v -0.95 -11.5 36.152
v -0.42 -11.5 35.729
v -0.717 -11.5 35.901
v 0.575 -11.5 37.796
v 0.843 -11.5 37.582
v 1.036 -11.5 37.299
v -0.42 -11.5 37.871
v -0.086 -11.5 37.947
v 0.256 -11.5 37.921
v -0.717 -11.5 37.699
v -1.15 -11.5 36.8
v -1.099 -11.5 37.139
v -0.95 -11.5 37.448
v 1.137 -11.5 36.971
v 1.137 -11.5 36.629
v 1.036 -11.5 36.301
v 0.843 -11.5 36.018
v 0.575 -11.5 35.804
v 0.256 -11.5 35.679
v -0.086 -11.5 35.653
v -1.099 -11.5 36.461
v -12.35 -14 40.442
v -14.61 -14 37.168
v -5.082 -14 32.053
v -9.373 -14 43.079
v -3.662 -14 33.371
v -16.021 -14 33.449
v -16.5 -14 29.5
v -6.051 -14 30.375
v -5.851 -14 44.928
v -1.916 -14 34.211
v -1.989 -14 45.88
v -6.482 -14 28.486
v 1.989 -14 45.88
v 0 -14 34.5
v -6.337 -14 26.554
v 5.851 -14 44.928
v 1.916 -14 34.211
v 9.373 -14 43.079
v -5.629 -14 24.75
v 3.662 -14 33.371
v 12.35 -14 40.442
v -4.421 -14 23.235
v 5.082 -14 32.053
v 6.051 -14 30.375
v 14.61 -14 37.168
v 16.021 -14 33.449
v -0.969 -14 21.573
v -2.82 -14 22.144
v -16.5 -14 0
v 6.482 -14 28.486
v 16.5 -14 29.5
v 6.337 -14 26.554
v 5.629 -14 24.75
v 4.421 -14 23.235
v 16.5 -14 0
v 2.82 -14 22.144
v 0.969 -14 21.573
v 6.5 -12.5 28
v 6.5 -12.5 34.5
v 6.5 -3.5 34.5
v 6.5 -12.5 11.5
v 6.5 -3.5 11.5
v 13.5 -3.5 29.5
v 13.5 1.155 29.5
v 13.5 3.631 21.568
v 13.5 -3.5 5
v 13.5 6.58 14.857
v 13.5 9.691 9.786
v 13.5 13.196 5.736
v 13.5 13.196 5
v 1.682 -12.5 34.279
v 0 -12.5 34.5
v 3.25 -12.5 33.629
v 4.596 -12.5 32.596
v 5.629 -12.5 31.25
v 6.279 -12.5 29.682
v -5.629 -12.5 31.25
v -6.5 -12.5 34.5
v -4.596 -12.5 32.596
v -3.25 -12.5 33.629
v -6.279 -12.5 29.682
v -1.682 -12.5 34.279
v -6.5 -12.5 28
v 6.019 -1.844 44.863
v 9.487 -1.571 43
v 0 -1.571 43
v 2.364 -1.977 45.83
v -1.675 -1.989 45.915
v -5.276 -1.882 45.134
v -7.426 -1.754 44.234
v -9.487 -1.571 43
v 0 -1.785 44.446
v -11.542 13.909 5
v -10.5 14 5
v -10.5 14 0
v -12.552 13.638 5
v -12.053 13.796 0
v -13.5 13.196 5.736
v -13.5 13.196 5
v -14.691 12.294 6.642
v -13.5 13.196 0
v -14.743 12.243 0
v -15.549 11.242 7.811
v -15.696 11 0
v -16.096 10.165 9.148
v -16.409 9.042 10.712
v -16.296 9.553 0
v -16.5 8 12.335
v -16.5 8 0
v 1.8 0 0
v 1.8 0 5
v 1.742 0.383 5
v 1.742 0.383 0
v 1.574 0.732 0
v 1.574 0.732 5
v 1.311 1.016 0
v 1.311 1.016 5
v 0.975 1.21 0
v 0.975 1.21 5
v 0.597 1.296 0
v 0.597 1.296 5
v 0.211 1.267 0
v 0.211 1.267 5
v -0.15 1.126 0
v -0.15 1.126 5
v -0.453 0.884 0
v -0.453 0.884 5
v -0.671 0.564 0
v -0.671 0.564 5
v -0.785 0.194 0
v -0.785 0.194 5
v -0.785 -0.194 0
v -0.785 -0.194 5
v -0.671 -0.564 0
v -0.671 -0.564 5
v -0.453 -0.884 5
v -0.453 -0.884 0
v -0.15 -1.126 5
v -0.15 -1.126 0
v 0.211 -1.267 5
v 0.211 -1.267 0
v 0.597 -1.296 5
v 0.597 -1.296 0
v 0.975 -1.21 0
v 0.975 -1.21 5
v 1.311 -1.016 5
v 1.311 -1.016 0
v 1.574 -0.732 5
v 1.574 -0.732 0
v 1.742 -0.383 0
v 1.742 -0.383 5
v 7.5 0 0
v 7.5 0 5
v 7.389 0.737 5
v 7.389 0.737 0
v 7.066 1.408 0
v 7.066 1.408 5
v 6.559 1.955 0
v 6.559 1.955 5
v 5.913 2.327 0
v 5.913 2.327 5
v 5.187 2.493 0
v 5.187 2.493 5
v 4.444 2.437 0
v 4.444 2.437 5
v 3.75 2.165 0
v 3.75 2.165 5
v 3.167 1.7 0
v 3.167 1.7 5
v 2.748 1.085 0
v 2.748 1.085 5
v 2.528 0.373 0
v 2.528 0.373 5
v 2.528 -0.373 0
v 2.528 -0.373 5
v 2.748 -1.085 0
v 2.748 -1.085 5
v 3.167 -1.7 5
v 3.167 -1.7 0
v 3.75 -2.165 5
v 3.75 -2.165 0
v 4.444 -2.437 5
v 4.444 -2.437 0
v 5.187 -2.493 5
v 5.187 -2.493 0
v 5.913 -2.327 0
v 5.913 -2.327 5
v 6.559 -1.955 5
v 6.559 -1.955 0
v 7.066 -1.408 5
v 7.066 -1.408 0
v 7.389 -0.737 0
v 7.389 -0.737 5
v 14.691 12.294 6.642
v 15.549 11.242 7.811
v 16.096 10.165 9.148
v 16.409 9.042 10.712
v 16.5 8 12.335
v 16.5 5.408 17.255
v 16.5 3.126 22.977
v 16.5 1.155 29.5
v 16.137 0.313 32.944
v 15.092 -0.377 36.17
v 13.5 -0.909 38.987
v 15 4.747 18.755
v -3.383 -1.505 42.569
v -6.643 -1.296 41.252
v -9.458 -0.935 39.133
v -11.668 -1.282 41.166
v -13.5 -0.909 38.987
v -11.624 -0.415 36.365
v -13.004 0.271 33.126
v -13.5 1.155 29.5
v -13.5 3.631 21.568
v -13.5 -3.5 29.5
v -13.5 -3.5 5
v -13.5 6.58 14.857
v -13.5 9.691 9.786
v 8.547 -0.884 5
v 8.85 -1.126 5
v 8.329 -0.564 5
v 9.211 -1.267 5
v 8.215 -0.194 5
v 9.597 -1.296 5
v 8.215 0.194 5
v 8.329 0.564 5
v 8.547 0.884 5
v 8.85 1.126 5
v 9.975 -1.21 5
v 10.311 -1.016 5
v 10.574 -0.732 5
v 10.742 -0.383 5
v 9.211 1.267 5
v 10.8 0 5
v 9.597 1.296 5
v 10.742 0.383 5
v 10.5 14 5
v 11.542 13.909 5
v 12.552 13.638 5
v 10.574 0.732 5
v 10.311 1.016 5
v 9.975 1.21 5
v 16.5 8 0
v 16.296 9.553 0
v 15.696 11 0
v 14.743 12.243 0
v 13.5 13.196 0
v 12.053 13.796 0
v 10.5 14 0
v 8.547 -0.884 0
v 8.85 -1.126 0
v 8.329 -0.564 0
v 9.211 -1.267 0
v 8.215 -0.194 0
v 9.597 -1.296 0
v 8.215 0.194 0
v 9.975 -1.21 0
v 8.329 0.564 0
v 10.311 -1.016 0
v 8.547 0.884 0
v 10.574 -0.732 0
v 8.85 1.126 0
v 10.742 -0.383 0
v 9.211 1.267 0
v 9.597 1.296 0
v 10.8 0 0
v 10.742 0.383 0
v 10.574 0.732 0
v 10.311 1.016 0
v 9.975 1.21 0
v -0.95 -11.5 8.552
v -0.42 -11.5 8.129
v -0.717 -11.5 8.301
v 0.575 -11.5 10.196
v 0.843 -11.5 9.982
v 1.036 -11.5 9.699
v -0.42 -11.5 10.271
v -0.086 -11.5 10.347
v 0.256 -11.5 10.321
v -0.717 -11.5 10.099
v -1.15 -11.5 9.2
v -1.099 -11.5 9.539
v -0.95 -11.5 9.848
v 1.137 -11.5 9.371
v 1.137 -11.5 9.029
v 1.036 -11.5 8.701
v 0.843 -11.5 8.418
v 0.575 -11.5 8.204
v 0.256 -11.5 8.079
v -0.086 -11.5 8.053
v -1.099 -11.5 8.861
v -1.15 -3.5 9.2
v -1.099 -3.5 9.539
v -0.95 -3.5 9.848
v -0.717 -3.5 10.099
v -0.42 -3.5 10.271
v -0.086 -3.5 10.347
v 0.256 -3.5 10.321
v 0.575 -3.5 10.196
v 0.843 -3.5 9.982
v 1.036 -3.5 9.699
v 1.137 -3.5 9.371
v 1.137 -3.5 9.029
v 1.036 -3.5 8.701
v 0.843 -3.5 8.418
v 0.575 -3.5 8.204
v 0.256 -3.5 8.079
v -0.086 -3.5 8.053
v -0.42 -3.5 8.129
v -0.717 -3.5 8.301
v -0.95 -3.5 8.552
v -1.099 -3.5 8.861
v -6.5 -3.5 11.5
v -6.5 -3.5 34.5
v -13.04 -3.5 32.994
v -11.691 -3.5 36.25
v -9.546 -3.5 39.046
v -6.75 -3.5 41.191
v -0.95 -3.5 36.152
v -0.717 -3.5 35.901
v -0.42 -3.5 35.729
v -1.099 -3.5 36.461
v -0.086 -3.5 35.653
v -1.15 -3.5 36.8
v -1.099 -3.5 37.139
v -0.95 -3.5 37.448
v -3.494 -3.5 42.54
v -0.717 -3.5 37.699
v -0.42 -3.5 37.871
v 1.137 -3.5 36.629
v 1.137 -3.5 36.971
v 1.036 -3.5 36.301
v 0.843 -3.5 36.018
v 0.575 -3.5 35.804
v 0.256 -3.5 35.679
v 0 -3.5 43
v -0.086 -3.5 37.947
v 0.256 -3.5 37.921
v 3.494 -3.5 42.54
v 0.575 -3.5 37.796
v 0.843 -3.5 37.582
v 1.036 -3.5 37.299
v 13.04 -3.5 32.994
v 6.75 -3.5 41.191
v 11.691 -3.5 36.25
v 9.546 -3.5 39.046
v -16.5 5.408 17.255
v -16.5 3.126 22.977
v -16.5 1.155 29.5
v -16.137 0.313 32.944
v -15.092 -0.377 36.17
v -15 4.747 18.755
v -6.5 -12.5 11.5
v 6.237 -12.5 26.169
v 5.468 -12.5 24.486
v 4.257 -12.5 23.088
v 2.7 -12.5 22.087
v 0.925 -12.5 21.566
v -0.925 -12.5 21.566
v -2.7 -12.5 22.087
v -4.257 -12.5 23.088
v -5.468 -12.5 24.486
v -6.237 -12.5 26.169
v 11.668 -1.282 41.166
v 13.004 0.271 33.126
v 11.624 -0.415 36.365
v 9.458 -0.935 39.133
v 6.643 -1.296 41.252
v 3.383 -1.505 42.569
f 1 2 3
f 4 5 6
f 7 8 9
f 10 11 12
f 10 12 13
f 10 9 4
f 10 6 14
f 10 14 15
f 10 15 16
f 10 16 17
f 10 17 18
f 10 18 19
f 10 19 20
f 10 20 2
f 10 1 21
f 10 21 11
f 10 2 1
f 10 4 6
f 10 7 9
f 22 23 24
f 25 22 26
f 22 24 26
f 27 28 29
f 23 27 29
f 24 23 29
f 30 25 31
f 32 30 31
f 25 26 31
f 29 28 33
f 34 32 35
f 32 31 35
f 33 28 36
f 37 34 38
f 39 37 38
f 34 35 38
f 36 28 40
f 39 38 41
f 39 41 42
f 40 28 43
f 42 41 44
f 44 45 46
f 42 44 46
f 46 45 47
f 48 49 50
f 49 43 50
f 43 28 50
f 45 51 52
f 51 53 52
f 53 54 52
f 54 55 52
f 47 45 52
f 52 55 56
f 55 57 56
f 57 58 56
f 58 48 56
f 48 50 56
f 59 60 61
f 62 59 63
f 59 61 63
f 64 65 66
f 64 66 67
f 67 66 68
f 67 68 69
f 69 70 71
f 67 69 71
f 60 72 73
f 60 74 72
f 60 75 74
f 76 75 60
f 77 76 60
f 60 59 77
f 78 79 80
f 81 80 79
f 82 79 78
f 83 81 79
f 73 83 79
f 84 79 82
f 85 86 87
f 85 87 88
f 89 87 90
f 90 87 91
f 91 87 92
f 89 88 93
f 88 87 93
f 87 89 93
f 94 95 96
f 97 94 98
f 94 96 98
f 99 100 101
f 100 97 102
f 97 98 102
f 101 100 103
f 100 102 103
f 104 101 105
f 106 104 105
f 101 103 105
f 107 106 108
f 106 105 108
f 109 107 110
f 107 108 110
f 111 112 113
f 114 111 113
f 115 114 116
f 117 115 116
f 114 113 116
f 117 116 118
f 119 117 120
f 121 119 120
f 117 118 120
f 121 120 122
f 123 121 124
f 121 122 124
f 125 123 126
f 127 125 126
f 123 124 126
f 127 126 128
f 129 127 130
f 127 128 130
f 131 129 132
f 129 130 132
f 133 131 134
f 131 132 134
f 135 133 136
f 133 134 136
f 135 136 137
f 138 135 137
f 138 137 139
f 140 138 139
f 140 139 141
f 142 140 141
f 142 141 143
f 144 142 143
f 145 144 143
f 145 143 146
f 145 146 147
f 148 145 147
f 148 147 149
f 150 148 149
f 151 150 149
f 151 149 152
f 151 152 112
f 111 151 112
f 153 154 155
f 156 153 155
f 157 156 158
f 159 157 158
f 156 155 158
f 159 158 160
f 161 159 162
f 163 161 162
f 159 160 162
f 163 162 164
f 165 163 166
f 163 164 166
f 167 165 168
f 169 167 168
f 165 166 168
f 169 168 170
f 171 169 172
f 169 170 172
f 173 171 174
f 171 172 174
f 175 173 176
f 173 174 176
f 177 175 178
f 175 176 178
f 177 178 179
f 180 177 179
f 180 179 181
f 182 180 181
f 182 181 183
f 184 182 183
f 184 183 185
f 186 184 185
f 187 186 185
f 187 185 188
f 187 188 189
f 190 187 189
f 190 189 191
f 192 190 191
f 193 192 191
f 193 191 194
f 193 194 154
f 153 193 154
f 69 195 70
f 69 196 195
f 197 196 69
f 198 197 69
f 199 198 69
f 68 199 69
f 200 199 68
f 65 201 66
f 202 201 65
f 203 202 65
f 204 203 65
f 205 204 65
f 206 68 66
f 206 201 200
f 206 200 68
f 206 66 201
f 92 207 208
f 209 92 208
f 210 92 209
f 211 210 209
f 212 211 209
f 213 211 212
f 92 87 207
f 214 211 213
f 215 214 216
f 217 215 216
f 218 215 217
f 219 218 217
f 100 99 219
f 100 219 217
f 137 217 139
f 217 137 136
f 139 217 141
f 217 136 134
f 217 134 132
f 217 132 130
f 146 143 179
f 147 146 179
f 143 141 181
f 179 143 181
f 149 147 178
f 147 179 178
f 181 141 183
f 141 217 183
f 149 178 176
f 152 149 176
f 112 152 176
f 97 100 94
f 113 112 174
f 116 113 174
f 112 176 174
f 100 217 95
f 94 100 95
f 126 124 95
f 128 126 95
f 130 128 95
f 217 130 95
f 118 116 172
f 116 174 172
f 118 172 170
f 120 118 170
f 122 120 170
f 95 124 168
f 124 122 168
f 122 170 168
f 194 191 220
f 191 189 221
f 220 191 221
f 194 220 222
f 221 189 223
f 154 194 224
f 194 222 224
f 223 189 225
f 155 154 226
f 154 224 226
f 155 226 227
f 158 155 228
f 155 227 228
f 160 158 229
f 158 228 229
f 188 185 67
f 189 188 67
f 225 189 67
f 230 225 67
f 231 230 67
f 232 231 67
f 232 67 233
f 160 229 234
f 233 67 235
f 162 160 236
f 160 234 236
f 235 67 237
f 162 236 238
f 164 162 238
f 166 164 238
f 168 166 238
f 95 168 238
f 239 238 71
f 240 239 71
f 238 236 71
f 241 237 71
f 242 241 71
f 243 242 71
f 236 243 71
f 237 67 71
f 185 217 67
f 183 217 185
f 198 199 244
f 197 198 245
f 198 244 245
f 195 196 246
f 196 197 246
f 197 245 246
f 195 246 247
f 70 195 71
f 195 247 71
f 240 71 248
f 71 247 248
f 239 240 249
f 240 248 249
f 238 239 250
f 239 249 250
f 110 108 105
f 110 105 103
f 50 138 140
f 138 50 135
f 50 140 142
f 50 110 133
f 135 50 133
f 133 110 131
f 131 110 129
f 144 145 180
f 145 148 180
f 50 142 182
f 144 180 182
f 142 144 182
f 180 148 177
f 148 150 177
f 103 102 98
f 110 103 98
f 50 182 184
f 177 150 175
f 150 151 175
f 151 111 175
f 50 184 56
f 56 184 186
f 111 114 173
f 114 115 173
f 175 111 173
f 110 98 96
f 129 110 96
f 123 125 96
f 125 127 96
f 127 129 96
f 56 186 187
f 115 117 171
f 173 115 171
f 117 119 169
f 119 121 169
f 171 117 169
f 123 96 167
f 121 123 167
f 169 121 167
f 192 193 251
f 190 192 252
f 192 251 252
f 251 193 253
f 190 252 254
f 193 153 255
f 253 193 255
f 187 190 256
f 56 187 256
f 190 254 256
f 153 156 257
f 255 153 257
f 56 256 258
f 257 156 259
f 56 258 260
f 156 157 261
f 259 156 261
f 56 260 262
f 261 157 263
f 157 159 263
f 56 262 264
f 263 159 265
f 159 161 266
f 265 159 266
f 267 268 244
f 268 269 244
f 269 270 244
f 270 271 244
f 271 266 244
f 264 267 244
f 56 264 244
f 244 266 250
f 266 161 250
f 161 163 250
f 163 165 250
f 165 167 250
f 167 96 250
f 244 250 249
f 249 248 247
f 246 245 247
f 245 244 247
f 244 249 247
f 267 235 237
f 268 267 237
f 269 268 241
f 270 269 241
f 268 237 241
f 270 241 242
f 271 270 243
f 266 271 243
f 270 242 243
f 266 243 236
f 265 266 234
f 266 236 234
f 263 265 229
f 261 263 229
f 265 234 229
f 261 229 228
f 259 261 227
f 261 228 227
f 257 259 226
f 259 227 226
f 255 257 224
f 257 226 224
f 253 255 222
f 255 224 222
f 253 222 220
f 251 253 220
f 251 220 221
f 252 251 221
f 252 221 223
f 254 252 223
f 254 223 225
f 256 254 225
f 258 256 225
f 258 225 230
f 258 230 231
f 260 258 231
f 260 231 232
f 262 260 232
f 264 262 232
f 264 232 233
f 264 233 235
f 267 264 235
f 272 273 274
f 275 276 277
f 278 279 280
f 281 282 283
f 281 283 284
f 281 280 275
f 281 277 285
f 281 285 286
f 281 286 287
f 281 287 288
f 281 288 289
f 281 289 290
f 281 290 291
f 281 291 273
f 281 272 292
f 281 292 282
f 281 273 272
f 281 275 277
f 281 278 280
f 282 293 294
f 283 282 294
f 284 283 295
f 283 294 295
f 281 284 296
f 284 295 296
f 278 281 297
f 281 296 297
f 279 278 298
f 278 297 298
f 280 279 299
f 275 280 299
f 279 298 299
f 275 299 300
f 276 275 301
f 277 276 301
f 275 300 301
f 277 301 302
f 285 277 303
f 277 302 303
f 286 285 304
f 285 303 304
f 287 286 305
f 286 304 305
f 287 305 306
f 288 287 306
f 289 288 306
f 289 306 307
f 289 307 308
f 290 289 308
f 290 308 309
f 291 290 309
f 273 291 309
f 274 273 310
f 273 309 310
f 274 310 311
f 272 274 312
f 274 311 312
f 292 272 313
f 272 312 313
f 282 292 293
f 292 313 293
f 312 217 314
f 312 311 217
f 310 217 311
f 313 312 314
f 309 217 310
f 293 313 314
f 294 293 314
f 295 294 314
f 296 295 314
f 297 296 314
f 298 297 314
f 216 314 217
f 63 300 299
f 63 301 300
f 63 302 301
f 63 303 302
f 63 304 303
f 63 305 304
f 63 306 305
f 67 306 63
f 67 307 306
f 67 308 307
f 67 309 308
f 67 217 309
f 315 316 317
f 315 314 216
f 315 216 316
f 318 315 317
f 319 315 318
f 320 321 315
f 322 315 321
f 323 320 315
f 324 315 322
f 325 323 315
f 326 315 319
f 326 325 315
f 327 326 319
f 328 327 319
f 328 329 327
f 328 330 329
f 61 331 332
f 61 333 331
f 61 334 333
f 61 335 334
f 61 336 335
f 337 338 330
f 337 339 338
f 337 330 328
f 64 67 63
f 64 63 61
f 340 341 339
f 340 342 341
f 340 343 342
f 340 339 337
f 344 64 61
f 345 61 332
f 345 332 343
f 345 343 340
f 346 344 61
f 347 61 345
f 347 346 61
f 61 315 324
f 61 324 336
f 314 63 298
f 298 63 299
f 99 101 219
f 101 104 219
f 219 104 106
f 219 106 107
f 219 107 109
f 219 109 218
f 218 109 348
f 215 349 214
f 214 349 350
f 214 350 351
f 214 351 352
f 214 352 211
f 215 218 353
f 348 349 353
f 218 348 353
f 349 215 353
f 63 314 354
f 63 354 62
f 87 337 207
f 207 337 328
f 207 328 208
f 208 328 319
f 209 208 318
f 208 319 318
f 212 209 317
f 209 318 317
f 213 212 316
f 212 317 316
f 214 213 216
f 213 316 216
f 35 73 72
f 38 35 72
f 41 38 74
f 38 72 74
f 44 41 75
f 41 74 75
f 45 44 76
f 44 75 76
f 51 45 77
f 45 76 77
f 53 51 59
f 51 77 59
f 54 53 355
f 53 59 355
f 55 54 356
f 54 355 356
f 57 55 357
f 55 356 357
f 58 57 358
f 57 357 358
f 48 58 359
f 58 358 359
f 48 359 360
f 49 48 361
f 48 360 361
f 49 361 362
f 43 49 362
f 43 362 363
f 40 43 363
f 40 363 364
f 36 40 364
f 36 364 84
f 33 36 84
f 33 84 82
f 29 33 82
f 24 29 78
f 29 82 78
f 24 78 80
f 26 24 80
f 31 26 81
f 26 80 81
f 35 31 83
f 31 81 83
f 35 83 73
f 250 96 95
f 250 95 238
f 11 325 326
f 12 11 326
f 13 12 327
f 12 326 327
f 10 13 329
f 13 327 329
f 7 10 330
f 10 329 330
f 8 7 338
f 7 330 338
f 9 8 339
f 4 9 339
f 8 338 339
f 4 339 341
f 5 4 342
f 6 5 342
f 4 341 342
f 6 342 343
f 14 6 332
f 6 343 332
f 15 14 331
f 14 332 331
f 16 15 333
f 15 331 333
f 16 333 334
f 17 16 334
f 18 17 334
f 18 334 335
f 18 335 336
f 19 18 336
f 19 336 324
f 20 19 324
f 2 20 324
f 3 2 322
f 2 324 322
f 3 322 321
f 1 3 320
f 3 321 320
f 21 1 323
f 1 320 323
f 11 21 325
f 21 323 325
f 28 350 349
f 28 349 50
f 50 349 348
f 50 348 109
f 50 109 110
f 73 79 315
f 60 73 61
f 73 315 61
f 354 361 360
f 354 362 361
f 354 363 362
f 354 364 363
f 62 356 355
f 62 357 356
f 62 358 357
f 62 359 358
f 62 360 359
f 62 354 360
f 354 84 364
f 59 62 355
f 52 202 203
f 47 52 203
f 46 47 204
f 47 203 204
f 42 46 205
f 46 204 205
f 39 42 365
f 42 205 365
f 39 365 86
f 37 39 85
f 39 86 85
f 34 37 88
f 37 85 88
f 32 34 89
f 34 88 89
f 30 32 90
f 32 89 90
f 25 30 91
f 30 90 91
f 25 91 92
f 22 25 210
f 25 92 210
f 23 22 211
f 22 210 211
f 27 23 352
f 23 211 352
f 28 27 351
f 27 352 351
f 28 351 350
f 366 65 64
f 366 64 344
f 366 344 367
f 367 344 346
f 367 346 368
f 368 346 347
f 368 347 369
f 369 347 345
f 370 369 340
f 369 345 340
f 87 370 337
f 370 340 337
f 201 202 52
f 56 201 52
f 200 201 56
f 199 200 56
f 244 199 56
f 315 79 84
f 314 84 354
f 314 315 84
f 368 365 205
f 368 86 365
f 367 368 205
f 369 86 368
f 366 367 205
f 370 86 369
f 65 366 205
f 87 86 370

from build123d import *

# Parameters (mm, degrees)
SKETCH2_W               = 33
SKETCH2_H               = 28
BOSS_EXTRUDE1_DEPTH     = 46
CUT_EXTRUDE1_DEPTH      = 59.318093247
CUT_EXTRUDE1_DEPTH_BACK = 59.318093247
SKETCH3_W               = 41
SKETCH3_H               = 17.5
BOSS_EXTRUDE2_DEPTH     = 3
BOSS_EXTRUDE3_DEPTH     = 27
FILLET2_START           = -3.5
FILLET2_DEPTH           = 4.654998639
FILLET2_START_2         = -13.5
FILLET2_2_DEPTH         = 27
FILLET3_R               = 16.5
FILLET4_R               = 6
SKETCH6_W               = 13
SKETCH6_H               = 23
CUT_EXTRUDE2_DEPTH      = 9
SKETCH7_R               = 6.5
CUT_EXTRUDE3_DEPTH      = 9
SKETCH8_R               = 1.15
CUT_EXTRUDE4_DEPTH      = 8
SKETCH9_R               = 1.3
SKETCH9_R_2             = 2.5
CUT_EXTRUDE5_DEPTH      = 47.360004954


with BuildPart() as part:
    # Sketch2 → Boss-Extrude1 (new body)
    with BuildSketch(Plane.XY):
        Rectangle(SKETCH2_W, SKETCH2_H)
    extrude(amount=BOSS_EXTRUDE1_DEPTH)

    # Sketch3 → Cut-Extrude1 (cut, two sides: drawn at the far end of the back side and taken through both)
    with BuildSketch(Plane.ZY.offset(16.5).offset(-CUT_EXTRUDE1_DEPTH_BACK)):
        with Locations((25.5, 5.25)):
            Rectangle(SKETCH3_W, SKETCH3_H)
    extrude(amount=CUT_EXTRUDE1_DEPTH + CUT_EXTRUDE1_DEPTH_BACK, mode=Mode.SUBTRACT)

    # Sketch4 → Boss-Extrude2 (add)
    with BuildSketch(Plane.ZY.offset(16.5)):
        with BuildLine():
            Line((46, -2), (46, -3.5))
            Line((46, -3.5), (5, -3.5))
            Line((5, -3.5), (5, 14))
            add(Edge.make_bspline(
                [(5, 14), (15.432246661, 2.101110375), (46, -2)],
                knots=[0, 0, 0, 1, 1, 1], degree=2))
        make_face()
    boss_extrude2 = extrude(amount=-BOSS_EXTRUDE2_DEPTH)

    # Mirror1: Boss-Extrude2 across plane
    add(boss_extrude2.mirror(Plane(origin=(0, 0, 0), x_dir=(0, 0, 1), z_dir=(1, 0, 0))))

    # Sketch5 → Boss-Extrude3 (add)
    with BuildSketch(Plane(origin=(-13.5, 0, 0), x_dir=(0, 0, -1), z_dir=(1, 0, 0))):
        with BuildLine():
            Line((-46, -3.5), (-43, -3.5))
            Line((-43, -3.5), (-43, -1.57137225))
            add(Edge.make_bspline(
                [(-43, -1.57137225), (-44.474940132, -1.795390955), (-46.000000067, -2.000000009)],
                knots=[0.950108864, 0.950108864, 0.950108864, 1, 1, 1], degree=2))
            Line((-46.000000067, -2.000000009), (-46, -3.5))
        make_face()
    extrude(amount=BOSS_EXTRUDE3_DEPTH)

    # Fillet2: read off the stored shape, not the designer's step
    # Fillet2 outline → Fillet2 (add)
    with BuildSketch(Plane(origin=(0, 0, 0), x_dir=(1, 0, 0), z_dir=(0, 1.0, -9.82210297214819e-12)).offset(FILLET2_START)):
        with BuildLine():
            Line((13.5, -43.00000001), (13.5, -29.5))
            ThreePointArc((13.5, -29.5), (9.545941546, -39.045941546), (0, -43))
            Line((0, -43), (13.5, -43.00000001))
        make_face()
        with BuildLine():
            Line((-13.5, -43), (0, -43))
            ThreePointArc((0, -43), (-9.545941546, -39.045941546), (-13.5, -29.5))
            Line((-13.5, -29.5), (-13.5, -43))
        make_face()
    extrude(amount=FILLET2_DEPTH)

    # Fillet2 2 outline → Fillet2 2 (cut)
    with BuildSketch(Plane.YZ.offset(FILLET2_START_2)):
        with BuildLine():
            Line((1.154998639, 43.000000001), (-1.57137225, 43.000000001))
            add(Edge.make_bspline(
                [(-1.57137225, 43.000000001), (-0.450949941, 35.623134616), (1.154998546, 29.499999976)],
                knots=[0.049891135, 0.049891135, 0.049891135, 0.299420037, 0.299420037, 0.299420037], degree=2))
            Line((1.154998546, 29.499999976), (1.154998639, 43.000000001))
        make_face()
    extrude(amount=FILLET2_2_DEPTH, mode=Mode.SUBTRACT)

    # Fillet3
    # the kernel refuses this fillet: 16.5 mm, written as the material it takes off along each edge
    with BuildSketch(Plane(origin=(-16.5, -55.25, 46), x_dir=(0, 0, -1), z_dir=(0, 1, 0)), Plane(origin=(16.5, 39.25, 46), x_dir=(0, 0, -1), z_dir=(0, -1, 0))) as fillet3_piece_1:
        with BuildLine():
            CenterArc((FILLET3_R, -FILLET3_R), FILLET3_R, 90, 90)
            Line((0, -FILLET3_R), (0, 0))
            Line((0, 0), (FILLET3_R, 0))
        make_face()
    extrude(amount=94.5, mode=Mode.SUBTRACT)

    # Fillet4
    # the kernel refuses this fillet: 6 mm, written as the material it takes off along each edge
    with BuildSketch(Plane(origin=(-16.5, 14, -15), x_dir=(1, 0, 0), z_dir=(0, 0, 1))) as fillet4_piece_1:
        with BuildLine():
            CenterArc((FILLET4_R, -FILLET4_R), FILLET4_R, 90, 90)
            Line((0, -FILLET4_R), (0, 0))
            Line((0, 0), (FILLET4_R, 0))
        make_face()
    extrude(amount=35, mode=Mode.SUBTRACT)
    with BuildSketch(Plane(origin=(16.5, 14, -15), x_dir=(-1, 0, 0), z_dir=(0, 0, 1))) as fillet4_piece_2:
        with BuildLine():
            CenterArc((FILLET4_R, FILLET4_R), FILLET4_R, 180, 90)
            Line((0, FILLET4_R), (0, 0))
            Line((0, 0), (FILLET4_R, 0))
        make_face()
    extrude(amount=35, mode=Mode.SUBTRACT)

    # Sketch6 → Cut-Extrude2 (cut)
    with BuildSketch(Plane(origin=(0, -3.5, 0), x_dir=(1, 0, 0), z_dir=(0, 1, 0))):
        with Locations((0, -23)):
            Rectangle(SKETCH6_W, SKETCH6_H)
    extrude(amount=-CUT_EXTRUDE2_DEPTH, mode=Mode.SUBTRACT)

    # Sketch7 → Cut-Extrude3 (cut)
    with BuildSketch(Plane(origin=(0, -12.5, 0), x_dir=(1, 0, 0), z_dir=(0, 1, 0))):
        with Locations(Location((0, -28, 0), (0, 0, 270))):
            Circle(SKETCH7_R)
    extrude(amount=-CUT_EXTRUDE3_DEPTH, mode=Mode.SUBTRACT)

    # Sketch8 → Cut-Extrude4 (cut)
    with BuildSketch(Plane(origin=(0, -3.5, 0), x_dir=(1, 0, 0), z_dir=(0, 1, 0))):
        with Locations(Location((0, -9.2, 0), (0, 0, 180))):
            Circle(SKETCH8_R)
        with Locations(Location((0, -36.8, 0), (0, 0, 180))):
            Circle(SKETCH8_R)
    extrude(amount=-CUT_EXTRUDE4_DEPTH, mode=Mode.SUBTRACT)

    # Sketch9 → Cut-Extrude5 (cut, through all)
    with BuildSketch(Plane.XY.offset(5)):
        with Locations((0.5, 0)):
            Circle(SKETCH9_R)
        with Locations((5, 0)):
            Circle(SKETCH9_R_2)
        with Locations((9.5, 0)):
            Circle(SKETCH9_R)
    extrude(amount=-CUT_EXTRUDE5_DEPTH, mode=Mode.SUBTRACT)


solid = part.part
